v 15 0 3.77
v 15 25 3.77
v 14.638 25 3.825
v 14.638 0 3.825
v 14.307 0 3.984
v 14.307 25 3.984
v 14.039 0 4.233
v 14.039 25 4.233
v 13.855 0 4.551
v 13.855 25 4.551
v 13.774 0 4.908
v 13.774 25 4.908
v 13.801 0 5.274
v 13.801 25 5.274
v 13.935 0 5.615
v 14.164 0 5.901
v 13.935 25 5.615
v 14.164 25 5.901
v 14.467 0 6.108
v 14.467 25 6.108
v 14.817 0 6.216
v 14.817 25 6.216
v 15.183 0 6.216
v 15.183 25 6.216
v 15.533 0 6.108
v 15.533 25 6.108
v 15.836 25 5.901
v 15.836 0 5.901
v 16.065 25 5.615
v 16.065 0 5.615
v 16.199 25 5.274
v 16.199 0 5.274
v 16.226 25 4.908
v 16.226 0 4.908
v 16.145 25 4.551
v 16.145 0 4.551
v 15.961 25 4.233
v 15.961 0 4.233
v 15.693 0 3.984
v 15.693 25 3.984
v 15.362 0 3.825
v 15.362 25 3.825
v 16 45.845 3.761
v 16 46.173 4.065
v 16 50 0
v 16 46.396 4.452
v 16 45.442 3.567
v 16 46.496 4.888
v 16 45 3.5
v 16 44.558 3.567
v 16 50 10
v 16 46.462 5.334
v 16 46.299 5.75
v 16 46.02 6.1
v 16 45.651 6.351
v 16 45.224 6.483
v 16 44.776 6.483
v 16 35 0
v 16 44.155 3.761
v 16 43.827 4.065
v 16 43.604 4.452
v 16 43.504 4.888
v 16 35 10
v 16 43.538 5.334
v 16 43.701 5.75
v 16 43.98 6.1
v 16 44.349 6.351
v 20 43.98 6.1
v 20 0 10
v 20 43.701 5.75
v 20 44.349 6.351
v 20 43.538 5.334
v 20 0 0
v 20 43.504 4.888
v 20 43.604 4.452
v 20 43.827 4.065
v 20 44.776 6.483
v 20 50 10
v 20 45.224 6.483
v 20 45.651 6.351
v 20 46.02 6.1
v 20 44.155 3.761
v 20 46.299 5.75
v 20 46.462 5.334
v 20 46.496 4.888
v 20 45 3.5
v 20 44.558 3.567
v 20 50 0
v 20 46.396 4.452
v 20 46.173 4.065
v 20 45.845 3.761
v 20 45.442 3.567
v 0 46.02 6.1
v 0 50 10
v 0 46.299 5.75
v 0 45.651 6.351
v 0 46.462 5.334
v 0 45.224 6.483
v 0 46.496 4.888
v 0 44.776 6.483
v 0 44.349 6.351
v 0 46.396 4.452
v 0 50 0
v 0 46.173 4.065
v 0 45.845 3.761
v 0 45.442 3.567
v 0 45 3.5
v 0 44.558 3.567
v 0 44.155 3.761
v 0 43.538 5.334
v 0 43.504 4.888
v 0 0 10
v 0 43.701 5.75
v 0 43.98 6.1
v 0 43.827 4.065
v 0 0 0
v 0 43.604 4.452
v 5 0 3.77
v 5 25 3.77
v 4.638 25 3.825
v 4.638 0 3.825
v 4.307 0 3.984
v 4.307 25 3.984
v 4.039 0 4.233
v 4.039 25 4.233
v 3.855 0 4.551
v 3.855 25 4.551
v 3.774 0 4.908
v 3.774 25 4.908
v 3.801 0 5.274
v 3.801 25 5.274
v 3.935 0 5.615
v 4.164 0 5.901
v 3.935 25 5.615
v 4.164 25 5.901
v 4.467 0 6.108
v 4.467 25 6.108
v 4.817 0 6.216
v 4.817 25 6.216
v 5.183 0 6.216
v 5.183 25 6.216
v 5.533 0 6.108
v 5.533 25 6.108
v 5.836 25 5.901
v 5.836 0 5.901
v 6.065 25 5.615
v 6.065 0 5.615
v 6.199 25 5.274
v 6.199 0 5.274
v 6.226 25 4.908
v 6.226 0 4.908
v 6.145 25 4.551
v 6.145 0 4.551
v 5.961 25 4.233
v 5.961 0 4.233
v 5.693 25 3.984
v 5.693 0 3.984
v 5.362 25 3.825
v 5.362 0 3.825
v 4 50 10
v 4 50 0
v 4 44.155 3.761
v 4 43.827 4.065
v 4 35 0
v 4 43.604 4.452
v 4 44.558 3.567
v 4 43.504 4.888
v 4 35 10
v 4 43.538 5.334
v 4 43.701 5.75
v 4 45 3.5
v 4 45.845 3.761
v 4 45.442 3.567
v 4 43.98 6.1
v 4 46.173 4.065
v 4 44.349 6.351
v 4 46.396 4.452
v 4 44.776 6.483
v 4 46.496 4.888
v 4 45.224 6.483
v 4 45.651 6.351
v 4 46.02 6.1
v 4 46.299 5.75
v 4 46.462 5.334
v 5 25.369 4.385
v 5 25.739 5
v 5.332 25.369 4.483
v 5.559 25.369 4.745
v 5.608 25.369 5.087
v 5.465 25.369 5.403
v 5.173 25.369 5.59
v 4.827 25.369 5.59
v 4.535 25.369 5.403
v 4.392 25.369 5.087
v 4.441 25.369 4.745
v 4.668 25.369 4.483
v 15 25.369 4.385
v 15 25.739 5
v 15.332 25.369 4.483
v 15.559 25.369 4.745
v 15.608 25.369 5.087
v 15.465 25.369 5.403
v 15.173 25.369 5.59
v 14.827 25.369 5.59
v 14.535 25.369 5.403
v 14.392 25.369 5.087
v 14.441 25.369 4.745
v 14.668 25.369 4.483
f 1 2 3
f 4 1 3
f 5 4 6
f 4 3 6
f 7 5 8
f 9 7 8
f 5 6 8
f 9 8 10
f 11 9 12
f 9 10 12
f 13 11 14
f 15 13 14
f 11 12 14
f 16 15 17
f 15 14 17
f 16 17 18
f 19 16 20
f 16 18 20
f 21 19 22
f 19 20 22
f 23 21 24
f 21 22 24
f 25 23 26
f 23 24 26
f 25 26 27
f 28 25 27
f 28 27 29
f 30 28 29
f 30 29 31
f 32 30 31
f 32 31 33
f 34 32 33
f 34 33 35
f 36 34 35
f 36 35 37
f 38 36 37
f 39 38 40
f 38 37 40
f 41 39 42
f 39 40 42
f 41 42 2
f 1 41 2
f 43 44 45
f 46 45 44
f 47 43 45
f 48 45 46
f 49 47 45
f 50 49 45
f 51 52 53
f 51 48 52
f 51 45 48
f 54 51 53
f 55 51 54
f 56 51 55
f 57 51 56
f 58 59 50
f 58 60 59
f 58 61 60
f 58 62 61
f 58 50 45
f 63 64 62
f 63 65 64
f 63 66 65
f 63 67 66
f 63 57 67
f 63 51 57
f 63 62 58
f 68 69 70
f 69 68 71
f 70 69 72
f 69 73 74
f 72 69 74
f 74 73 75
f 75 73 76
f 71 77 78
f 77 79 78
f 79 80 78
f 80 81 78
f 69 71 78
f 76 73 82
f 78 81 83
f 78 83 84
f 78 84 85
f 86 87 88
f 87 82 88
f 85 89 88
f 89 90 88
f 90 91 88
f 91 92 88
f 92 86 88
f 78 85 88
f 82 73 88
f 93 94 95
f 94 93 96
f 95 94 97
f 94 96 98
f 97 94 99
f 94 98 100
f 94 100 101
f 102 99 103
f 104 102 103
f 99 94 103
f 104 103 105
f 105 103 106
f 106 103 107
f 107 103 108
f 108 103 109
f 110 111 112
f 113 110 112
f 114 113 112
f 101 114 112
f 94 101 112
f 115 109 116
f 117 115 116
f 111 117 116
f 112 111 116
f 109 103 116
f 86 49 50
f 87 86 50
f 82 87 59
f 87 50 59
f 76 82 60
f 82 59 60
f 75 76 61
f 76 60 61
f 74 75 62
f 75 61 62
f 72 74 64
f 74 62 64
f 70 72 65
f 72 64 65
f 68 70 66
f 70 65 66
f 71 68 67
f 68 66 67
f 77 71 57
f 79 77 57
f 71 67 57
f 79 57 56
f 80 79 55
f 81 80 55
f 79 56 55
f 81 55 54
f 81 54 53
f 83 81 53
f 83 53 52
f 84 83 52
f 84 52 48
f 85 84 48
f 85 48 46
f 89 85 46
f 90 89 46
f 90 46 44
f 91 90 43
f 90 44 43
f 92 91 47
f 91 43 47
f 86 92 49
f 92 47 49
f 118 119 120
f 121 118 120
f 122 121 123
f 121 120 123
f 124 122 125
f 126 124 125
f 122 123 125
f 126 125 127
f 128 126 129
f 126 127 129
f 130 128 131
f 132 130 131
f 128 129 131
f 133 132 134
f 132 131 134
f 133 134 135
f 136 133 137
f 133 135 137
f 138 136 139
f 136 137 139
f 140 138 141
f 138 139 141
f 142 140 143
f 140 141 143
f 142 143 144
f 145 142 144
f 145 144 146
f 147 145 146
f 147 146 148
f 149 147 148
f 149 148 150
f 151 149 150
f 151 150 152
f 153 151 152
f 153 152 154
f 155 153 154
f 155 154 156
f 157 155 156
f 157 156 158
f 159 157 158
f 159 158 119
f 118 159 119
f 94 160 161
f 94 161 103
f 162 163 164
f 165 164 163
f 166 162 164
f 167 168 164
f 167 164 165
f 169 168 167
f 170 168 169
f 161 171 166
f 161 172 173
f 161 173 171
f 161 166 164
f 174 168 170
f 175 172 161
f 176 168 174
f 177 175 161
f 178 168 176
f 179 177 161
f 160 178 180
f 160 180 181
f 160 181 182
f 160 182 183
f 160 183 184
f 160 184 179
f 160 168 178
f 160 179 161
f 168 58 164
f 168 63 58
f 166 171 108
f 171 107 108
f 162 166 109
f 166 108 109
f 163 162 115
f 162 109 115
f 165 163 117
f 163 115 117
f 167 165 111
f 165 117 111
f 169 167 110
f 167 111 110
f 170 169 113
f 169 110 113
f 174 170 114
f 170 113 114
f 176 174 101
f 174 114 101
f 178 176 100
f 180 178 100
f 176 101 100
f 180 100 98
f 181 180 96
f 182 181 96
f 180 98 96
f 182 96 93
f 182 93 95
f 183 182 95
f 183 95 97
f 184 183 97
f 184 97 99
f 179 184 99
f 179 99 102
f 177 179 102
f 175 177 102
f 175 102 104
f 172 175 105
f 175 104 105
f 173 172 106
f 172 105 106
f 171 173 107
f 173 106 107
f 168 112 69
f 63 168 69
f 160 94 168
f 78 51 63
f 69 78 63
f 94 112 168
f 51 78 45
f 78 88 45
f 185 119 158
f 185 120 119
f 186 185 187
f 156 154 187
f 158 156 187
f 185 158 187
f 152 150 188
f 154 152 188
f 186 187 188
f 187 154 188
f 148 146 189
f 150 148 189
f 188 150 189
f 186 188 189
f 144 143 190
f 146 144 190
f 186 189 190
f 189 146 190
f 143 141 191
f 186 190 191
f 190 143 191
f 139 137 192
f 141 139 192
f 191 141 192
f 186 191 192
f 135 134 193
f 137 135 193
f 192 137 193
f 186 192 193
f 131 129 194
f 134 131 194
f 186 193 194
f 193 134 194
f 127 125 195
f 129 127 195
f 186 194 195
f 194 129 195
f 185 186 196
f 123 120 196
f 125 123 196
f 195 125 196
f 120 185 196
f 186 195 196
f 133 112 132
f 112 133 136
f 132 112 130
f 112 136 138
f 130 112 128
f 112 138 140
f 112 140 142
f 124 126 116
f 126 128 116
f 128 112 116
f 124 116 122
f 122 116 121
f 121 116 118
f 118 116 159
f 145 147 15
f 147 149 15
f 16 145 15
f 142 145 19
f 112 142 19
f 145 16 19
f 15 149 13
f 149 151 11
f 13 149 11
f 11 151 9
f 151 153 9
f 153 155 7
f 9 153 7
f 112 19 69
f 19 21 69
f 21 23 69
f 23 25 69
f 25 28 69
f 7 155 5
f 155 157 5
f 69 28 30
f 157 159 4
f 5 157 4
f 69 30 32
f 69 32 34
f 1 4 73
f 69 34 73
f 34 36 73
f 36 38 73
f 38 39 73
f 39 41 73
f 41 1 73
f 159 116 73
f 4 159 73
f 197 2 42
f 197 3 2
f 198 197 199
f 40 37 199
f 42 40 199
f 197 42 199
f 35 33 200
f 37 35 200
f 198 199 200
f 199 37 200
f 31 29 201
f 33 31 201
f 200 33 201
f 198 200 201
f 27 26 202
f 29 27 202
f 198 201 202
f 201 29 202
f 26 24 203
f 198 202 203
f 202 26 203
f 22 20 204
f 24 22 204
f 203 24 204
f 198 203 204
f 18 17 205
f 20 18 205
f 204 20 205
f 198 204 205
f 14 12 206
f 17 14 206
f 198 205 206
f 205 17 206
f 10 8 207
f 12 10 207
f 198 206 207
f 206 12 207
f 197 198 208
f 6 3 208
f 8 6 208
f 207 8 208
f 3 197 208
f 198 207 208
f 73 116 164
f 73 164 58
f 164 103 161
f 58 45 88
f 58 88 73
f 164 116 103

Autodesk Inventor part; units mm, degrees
ref_plane "YZ Plane" through (0, 0, 0) normal (1, 0, 0) x (0, 1, 0)
ref_plane "XZ Plane" through (0, 0, 0) normal (0, 1, 0) x (-1, 0, 0)
ref_plane "XY Plane" through (0, 0, 0) normal (0, 0, 1) x (1, 0, 0)
sketch "スケッチ1" plane through (0, 0, 0) normal (0, 0, 1) x (1, 0, 0)
  line L0 (0, 0) -> (20, 0)
  line L1 (20, 0) -> (20, 50)
  line L2 (20, 50) -> (0, 50)
  line L3 (0, 50) -> (0, 0)
  dimension "d0" = 20
  dimension "d1" = 50
extrude "押し出し1" add sketch "スケッチ1" along normal blind 10
sketch "スケッチ2" plane through (0, 0, 10) normal (0, 0, 1) x (1, 0, 0)
  line L0 (20, 50) -> (0, 50) projected
  line L1 (4, 50) -> (16, 50)
  line L2 (16, 50) -> (16, 40)
  line L3 (16, 40) -> (4, 40)
  line L4 (4, 40) -> (4, 50)
  line L5 (0, 50) -> (0, 0) projected
  dimension "d4" = 12
  dimension "d5" = 4
  dimension "d6" = 10
extrude "押し出し2" cut sketch "スケッチ2" against normal blind 10
sketch "スケッチ3" plane through (20, 0, 0) normal (1, 0, 0) x (0, 0, -1)
  line L0 (0, 50) -> (-10, 50) projected
  line L1 (0, 0) -> (0, 50) projected
  point P0 (-5, 45)
  dimension "d9" = 5
  dimension "d10" = 5
hole "穴1" at (20, 45, 5) direction (-1, 0, 0) diameter 3 end through all
sketch "スケッチ4" plane through (0, 0, 0) normal (0, -1, 0) x (1, 0, 0)
  line L0 (0, 0) -> (0, 10) projected
  line L1 (0, 10) -> (20, 10) projected
  line L2 (0, 0) -> (20, 0) projected
  line L3 (20, 0) -> (20, 10) projected
  point P0 (5, 5)
  point P1 (15, 5)
  dimension "d18" = 5
  dimension "d19" = 5
  dimension "d20" = 5
  dimension "d21" = 5
hole "穴2" at (5, 0, 5) at (15, 0, 5) direction (0, 1, 0) diameter 2.459 depth 25 tip angle 118 thread size "M3x0.5" class "6H" standard "ISO Metric profile"
sketch "スケッチ5" plane through (0, 0, 10) normal (0, 0, 1) x (1, 0, 0)
  line L0 (4, 40) -> (16, 40) projected
  line L1 (4, 40) -> (16, 40)
  line L2 (16, 40) -> (16, 35)
  line L3 (16, 35) -> (4, 35)
  line L4 (4, 35) -> (4, 40)
  point P0 (0, 0)
  dimension "d29" = 5
extrude "押し出し3" cut sketch "スケッチ5" against normal blind 10
properties part number "アーム支え"
